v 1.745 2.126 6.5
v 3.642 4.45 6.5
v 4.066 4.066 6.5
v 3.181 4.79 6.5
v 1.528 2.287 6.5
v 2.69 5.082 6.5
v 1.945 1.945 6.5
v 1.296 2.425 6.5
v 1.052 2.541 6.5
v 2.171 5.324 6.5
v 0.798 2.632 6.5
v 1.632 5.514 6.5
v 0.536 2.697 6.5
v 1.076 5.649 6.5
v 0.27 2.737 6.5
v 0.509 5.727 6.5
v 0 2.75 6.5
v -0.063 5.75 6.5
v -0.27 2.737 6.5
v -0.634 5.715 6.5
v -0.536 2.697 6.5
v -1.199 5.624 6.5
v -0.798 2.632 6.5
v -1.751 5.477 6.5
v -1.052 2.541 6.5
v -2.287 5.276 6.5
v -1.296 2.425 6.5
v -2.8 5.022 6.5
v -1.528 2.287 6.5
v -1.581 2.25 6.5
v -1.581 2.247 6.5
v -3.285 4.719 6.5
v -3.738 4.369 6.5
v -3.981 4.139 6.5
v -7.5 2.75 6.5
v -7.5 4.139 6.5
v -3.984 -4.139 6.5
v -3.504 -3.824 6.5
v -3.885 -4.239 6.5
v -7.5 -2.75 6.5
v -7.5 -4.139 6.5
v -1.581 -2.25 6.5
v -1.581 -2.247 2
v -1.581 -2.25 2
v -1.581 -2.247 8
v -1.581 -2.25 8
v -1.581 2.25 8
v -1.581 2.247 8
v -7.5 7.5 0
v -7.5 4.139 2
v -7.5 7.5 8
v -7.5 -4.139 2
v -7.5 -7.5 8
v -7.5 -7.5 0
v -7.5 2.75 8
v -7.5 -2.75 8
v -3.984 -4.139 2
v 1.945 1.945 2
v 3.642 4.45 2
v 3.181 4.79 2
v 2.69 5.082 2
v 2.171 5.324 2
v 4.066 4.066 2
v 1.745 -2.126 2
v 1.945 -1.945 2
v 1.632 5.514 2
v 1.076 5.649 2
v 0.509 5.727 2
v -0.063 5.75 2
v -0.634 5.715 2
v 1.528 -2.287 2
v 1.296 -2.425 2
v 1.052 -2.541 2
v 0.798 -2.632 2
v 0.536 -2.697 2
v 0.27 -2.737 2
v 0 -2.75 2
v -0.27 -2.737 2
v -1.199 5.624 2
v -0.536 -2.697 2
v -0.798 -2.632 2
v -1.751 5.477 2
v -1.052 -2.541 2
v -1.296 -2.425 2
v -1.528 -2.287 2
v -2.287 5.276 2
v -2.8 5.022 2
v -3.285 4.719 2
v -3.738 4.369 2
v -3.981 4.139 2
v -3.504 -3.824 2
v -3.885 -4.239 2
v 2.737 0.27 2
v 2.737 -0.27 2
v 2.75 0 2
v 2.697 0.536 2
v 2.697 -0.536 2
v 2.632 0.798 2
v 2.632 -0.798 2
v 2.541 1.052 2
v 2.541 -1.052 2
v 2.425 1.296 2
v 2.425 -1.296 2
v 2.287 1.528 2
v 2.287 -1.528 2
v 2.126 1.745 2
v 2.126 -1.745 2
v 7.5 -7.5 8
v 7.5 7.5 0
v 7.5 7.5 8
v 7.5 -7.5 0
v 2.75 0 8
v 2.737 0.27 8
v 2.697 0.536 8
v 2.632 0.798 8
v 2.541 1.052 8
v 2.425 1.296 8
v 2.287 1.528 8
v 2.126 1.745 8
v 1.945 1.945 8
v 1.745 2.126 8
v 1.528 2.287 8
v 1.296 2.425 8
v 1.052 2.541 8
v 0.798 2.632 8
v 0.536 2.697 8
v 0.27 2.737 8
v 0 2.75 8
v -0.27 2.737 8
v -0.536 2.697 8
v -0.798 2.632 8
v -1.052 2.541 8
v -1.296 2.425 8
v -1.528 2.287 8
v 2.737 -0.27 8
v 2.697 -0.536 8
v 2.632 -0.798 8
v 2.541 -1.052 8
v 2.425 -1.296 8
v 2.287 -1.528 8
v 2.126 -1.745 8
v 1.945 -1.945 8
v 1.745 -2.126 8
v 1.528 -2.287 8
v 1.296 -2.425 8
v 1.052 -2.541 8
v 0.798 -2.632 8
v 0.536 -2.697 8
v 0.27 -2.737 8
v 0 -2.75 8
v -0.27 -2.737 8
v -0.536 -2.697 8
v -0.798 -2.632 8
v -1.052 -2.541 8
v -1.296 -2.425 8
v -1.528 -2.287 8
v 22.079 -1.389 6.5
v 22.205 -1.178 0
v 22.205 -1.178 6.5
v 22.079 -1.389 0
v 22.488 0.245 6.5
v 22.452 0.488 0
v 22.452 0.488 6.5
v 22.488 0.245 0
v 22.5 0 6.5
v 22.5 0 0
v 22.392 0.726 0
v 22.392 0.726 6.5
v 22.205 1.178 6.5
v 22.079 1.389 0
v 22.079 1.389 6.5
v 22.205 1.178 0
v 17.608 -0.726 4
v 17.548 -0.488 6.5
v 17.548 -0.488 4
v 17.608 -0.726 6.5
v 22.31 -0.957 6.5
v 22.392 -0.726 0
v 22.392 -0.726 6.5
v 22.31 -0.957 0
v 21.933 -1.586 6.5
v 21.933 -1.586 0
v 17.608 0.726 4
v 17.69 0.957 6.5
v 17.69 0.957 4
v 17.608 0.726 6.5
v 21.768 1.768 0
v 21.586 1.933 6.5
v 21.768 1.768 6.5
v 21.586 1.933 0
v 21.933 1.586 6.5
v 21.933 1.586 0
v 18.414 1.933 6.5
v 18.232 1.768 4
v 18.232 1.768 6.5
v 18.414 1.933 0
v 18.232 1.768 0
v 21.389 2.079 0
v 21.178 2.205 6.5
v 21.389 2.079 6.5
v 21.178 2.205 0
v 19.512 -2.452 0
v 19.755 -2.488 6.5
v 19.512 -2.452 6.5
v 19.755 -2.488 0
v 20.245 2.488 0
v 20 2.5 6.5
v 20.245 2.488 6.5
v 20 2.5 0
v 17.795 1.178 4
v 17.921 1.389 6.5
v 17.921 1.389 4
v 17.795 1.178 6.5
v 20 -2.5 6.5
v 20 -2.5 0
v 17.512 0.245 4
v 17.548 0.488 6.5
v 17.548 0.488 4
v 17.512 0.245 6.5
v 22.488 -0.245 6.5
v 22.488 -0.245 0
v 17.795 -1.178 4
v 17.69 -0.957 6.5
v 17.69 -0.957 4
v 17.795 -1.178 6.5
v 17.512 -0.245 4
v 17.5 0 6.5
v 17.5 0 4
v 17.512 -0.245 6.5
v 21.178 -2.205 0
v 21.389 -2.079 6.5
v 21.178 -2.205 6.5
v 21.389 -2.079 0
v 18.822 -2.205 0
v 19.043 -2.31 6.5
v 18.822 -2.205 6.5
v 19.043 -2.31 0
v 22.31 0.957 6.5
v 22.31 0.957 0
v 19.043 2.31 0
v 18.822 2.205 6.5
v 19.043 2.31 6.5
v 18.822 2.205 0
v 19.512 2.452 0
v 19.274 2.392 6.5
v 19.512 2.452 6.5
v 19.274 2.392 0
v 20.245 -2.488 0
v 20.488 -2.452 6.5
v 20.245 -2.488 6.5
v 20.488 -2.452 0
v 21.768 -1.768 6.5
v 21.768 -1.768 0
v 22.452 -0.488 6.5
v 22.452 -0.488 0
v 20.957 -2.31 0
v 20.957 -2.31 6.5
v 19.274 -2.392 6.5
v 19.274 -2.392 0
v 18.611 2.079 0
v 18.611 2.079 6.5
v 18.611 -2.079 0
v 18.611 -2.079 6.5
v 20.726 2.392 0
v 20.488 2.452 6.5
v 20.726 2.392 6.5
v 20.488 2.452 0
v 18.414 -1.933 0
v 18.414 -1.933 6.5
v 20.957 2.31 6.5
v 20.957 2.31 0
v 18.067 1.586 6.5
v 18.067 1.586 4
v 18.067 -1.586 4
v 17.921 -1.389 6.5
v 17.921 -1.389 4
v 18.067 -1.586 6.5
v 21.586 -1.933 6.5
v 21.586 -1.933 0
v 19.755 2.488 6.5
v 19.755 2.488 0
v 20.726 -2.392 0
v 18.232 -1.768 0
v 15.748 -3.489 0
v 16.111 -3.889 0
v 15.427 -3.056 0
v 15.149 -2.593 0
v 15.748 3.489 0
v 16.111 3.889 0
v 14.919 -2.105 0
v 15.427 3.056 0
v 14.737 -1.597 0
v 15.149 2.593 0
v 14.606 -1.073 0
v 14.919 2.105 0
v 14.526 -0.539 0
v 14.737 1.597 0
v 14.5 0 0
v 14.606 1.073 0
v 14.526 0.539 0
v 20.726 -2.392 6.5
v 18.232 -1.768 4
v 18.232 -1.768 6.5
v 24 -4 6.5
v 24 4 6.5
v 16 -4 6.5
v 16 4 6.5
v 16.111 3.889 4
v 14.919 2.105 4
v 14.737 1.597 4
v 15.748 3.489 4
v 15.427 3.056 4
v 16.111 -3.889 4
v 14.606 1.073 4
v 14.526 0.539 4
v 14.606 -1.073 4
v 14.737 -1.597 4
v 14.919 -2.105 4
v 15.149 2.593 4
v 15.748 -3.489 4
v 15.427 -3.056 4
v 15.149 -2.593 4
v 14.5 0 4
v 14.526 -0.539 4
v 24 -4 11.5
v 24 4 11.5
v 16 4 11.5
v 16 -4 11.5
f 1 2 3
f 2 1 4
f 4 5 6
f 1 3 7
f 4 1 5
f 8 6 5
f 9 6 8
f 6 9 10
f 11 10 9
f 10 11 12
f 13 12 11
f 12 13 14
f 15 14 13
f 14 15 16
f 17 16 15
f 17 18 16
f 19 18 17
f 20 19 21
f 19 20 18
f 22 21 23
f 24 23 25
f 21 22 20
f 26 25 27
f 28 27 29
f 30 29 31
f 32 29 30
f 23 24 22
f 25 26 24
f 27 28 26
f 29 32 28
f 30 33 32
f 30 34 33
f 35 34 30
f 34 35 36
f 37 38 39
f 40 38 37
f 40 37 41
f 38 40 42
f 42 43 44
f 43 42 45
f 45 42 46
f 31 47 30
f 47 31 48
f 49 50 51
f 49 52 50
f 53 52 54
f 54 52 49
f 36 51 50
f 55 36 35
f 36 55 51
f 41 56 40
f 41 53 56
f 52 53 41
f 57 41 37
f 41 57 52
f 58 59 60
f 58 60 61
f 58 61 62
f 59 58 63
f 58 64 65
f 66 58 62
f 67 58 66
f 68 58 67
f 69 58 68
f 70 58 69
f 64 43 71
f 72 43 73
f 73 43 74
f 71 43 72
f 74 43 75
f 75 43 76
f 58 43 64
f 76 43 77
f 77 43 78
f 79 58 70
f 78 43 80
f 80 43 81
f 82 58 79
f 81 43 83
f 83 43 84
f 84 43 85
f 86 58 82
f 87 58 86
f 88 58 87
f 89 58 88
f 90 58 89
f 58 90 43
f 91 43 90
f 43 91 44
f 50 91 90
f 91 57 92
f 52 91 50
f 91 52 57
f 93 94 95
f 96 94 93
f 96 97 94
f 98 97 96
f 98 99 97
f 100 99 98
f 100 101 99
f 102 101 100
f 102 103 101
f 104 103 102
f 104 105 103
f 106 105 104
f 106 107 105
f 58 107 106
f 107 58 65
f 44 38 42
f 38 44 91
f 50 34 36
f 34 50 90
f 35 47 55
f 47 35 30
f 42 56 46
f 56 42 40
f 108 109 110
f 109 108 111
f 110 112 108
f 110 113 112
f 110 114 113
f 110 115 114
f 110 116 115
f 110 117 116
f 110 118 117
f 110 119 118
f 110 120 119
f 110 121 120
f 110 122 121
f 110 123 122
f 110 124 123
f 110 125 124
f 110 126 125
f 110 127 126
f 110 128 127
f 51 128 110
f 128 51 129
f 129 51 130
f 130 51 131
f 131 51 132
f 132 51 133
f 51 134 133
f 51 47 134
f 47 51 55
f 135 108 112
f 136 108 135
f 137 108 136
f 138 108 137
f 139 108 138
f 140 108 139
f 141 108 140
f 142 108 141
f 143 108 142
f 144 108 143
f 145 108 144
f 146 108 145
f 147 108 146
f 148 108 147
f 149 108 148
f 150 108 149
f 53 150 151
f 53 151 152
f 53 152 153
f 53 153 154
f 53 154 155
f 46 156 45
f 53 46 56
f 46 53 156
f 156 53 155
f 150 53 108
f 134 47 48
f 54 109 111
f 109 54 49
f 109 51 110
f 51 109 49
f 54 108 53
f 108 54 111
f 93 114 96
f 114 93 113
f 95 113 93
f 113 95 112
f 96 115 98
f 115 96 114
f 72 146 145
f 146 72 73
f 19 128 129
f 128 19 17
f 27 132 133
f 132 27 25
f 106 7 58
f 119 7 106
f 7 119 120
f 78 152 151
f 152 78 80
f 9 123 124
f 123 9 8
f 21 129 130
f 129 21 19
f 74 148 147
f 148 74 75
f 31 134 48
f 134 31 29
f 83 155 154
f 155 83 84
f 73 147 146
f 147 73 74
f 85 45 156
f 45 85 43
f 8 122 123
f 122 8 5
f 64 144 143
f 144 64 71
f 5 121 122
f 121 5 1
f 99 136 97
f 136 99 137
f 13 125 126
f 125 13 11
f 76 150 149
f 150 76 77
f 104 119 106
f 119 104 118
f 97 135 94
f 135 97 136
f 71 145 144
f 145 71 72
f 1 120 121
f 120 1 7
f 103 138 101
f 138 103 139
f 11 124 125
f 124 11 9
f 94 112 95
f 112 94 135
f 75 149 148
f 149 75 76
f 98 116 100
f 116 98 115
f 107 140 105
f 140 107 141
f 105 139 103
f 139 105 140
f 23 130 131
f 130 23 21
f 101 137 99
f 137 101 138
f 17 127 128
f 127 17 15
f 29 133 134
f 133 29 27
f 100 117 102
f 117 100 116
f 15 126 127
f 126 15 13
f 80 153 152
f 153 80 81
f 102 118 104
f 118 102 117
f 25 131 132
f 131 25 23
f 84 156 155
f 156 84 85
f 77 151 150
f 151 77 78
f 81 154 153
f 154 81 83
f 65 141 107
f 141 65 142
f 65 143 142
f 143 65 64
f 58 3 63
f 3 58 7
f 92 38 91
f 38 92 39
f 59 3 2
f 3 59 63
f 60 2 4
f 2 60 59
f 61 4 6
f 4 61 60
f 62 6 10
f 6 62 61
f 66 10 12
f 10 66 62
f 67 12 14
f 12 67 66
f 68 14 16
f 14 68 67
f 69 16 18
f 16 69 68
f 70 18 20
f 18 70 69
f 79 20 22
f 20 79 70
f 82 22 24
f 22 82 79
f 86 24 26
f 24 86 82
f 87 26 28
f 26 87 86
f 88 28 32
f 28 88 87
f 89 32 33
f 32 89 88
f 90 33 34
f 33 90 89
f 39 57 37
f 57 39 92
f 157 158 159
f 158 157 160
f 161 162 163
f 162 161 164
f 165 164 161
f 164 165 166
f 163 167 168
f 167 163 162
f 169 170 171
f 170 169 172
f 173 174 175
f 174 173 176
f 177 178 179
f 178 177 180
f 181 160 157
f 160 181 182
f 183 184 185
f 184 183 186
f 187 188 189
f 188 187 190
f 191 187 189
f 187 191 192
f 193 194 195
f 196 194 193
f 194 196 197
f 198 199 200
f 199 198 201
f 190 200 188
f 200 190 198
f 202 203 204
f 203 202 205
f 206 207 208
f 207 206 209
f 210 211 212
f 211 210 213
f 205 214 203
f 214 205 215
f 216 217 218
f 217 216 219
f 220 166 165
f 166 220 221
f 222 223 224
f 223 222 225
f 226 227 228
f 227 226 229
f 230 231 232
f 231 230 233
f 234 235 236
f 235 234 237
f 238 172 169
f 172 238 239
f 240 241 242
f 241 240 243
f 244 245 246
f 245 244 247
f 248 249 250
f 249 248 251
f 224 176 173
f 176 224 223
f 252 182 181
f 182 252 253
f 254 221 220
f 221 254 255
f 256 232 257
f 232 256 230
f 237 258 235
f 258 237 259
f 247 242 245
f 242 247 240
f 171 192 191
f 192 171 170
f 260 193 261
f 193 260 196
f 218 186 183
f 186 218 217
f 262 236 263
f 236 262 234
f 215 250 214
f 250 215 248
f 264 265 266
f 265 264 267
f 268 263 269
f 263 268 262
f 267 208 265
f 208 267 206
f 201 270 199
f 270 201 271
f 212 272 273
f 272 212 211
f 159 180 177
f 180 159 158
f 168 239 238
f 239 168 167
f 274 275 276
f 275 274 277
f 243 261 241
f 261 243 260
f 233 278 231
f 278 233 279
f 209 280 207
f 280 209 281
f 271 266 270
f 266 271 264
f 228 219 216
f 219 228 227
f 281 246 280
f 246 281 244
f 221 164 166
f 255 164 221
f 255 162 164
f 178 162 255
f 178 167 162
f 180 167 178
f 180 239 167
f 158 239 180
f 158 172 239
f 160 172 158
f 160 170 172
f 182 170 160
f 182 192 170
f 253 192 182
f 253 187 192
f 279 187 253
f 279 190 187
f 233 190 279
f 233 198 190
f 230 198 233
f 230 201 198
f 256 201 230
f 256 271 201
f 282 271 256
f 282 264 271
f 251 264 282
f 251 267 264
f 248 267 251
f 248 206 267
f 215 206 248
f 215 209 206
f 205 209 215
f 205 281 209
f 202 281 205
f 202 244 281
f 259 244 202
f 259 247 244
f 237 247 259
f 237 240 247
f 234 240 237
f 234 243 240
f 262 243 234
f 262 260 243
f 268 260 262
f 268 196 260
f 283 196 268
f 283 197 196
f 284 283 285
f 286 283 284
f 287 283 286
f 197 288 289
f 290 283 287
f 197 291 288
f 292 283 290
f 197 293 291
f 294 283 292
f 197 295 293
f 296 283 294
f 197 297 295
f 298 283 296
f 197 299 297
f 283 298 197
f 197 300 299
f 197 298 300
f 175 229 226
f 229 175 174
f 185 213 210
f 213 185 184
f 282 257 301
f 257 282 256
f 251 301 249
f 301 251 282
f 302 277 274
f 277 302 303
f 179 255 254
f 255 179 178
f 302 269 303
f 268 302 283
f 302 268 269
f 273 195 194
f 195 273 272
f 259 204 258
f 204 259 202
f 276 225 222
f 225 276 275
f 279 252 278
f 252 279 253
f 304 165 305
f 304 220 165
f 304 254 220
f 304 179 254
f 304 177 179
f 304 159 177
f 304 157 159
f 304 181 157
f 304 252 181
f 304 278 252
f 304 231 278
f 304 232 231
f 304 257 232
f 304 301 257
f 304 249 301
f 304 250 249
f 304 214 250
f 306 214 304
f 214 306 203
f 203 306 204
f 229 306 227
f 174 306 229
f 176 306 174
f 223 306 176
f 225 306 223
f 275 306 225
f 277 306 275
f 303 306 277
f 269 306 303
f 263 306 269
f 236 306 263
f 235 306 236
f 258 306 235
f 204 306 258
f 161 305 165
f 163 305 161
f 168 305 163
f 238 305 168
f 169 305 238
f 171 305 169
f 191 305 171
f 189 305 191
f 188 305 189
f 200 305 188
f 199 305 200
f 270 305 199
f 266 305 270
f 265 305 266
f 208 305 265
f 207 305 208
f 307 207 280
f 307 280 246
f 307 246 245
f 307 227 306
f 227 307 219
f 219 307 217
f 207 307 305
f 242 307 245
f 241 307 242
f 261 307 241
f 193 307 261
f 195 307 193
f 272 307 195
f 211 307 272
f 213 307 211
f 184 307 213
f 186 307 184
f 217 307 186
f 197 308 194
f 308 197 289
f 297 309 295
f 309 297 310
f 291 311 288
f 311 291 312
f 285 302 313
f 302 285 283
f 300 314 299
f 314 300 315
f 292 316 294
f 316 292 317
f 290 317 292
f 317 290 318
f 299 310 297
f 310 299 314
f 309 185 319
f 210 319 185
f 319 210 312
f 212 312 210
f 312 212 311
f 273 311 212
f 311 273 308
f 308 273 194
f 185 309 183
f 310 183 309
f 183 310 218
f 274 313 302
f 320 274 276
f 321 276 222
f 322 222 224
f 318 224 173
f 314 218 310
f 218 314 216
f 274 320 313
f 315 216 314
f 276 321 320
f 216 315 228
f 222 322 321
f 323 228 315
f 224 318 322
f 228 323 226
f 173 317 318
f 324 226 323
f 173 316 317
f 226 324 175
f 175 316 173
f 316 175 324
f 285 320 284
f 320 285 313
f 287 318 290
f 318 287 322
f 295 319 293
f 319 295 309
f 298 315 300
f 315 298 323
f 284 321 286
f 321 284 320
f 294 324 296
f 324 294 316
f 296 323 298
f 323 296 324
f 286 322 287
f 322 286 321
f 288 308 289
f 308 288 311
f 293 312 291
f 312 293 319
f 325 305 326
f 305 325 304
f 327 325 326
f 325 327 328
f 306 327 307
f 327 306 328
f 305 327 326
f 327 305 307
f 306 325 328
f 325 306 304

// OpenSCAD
/*
 * Twist-Stem twisting interlocking mechanism
 *
 * Copyright (C) 2023 Matthias Neeracher <microtherion@gmail.com>
 */

$fn = $preview ? 32 : 64;

module _twist_stem_funnel(width, height, stem, wedge, wall, htol, vtol, pinch) {
    r = 0.5*(stem+htol);
    pd = stem-pinch;
    h = sqrt(r*r-0.25*pd*pd);
    v = (0.5*width-wall)*sin(0.5*wedge)+0.5*htol;
    o = (0.5*width-wall)*cos(0.5*wedge);
    translate([0, 0, wall]) linear_extrude(height+vtol-2*wall) polygon([[-0.5*width, -v], [-o, -v], [-h, -0.5*pd], [-h, 0.5*pd], [-o, v], [-0.5*width, v]]);
    translate([0, 0, height+vtol-wall]) linear_extrude(wall) polygon([[-0.5*width, -r], [-h, -0.5*pd], [-h, 0.5*pd], [-0.5*width, r]]);
}

module twist_stem_base(width, height, stem, wedge=90, wall=2.0, htol=0.5, vtol=0.5, pinch=0.5) {
    difference() {
        translate([-0.5*width, -0.5*width, 0]) cube([width, width, height]);
        translate([0, 0, wall]) cylinder(height, d=stem+htol);
        translate([0, 0, wall]) rotate([0, 0, 90-0.5*wedge]) rotate_extrude(angle=90+wedge+2.5) square([0.5*(width+htol)-wall, height+vtol-2*wall]);
        _twist_stem_funnel(width, height, stem, wedge, wall, htol, vtol, pinch);
    }
}

module twist_stem_insert(width, height, stem, wedge=90, wall=2.0, vtol=0.5) {
    cylinder(height-wall+vtol, d=stem);
    rotate([0, 0, 180-0.5*wedge]) rotate_extrude(angle=wedge) square([0.5*width-wall, height-2*wall]);
}

function twist_stem_insert_height(height, wall=2.0, vtol=0.5) = height-wall+vtol;

module twist_stem_demo_project(width, height, stem) {
    insert_width=stem+3;
    twist_stem_base(width, height, stem);
    translate([width+5, 0, 0]) {
        twist_stem_insert(width, height, stem);
        translate([-0.5*insert_width, -0.5*insert_width, twist_stem_insert_height(height)]) cube([insert_width, insert_width, 5]);
    }
}

twist_stem_demo_project(width=15, height=8, stem=5);
